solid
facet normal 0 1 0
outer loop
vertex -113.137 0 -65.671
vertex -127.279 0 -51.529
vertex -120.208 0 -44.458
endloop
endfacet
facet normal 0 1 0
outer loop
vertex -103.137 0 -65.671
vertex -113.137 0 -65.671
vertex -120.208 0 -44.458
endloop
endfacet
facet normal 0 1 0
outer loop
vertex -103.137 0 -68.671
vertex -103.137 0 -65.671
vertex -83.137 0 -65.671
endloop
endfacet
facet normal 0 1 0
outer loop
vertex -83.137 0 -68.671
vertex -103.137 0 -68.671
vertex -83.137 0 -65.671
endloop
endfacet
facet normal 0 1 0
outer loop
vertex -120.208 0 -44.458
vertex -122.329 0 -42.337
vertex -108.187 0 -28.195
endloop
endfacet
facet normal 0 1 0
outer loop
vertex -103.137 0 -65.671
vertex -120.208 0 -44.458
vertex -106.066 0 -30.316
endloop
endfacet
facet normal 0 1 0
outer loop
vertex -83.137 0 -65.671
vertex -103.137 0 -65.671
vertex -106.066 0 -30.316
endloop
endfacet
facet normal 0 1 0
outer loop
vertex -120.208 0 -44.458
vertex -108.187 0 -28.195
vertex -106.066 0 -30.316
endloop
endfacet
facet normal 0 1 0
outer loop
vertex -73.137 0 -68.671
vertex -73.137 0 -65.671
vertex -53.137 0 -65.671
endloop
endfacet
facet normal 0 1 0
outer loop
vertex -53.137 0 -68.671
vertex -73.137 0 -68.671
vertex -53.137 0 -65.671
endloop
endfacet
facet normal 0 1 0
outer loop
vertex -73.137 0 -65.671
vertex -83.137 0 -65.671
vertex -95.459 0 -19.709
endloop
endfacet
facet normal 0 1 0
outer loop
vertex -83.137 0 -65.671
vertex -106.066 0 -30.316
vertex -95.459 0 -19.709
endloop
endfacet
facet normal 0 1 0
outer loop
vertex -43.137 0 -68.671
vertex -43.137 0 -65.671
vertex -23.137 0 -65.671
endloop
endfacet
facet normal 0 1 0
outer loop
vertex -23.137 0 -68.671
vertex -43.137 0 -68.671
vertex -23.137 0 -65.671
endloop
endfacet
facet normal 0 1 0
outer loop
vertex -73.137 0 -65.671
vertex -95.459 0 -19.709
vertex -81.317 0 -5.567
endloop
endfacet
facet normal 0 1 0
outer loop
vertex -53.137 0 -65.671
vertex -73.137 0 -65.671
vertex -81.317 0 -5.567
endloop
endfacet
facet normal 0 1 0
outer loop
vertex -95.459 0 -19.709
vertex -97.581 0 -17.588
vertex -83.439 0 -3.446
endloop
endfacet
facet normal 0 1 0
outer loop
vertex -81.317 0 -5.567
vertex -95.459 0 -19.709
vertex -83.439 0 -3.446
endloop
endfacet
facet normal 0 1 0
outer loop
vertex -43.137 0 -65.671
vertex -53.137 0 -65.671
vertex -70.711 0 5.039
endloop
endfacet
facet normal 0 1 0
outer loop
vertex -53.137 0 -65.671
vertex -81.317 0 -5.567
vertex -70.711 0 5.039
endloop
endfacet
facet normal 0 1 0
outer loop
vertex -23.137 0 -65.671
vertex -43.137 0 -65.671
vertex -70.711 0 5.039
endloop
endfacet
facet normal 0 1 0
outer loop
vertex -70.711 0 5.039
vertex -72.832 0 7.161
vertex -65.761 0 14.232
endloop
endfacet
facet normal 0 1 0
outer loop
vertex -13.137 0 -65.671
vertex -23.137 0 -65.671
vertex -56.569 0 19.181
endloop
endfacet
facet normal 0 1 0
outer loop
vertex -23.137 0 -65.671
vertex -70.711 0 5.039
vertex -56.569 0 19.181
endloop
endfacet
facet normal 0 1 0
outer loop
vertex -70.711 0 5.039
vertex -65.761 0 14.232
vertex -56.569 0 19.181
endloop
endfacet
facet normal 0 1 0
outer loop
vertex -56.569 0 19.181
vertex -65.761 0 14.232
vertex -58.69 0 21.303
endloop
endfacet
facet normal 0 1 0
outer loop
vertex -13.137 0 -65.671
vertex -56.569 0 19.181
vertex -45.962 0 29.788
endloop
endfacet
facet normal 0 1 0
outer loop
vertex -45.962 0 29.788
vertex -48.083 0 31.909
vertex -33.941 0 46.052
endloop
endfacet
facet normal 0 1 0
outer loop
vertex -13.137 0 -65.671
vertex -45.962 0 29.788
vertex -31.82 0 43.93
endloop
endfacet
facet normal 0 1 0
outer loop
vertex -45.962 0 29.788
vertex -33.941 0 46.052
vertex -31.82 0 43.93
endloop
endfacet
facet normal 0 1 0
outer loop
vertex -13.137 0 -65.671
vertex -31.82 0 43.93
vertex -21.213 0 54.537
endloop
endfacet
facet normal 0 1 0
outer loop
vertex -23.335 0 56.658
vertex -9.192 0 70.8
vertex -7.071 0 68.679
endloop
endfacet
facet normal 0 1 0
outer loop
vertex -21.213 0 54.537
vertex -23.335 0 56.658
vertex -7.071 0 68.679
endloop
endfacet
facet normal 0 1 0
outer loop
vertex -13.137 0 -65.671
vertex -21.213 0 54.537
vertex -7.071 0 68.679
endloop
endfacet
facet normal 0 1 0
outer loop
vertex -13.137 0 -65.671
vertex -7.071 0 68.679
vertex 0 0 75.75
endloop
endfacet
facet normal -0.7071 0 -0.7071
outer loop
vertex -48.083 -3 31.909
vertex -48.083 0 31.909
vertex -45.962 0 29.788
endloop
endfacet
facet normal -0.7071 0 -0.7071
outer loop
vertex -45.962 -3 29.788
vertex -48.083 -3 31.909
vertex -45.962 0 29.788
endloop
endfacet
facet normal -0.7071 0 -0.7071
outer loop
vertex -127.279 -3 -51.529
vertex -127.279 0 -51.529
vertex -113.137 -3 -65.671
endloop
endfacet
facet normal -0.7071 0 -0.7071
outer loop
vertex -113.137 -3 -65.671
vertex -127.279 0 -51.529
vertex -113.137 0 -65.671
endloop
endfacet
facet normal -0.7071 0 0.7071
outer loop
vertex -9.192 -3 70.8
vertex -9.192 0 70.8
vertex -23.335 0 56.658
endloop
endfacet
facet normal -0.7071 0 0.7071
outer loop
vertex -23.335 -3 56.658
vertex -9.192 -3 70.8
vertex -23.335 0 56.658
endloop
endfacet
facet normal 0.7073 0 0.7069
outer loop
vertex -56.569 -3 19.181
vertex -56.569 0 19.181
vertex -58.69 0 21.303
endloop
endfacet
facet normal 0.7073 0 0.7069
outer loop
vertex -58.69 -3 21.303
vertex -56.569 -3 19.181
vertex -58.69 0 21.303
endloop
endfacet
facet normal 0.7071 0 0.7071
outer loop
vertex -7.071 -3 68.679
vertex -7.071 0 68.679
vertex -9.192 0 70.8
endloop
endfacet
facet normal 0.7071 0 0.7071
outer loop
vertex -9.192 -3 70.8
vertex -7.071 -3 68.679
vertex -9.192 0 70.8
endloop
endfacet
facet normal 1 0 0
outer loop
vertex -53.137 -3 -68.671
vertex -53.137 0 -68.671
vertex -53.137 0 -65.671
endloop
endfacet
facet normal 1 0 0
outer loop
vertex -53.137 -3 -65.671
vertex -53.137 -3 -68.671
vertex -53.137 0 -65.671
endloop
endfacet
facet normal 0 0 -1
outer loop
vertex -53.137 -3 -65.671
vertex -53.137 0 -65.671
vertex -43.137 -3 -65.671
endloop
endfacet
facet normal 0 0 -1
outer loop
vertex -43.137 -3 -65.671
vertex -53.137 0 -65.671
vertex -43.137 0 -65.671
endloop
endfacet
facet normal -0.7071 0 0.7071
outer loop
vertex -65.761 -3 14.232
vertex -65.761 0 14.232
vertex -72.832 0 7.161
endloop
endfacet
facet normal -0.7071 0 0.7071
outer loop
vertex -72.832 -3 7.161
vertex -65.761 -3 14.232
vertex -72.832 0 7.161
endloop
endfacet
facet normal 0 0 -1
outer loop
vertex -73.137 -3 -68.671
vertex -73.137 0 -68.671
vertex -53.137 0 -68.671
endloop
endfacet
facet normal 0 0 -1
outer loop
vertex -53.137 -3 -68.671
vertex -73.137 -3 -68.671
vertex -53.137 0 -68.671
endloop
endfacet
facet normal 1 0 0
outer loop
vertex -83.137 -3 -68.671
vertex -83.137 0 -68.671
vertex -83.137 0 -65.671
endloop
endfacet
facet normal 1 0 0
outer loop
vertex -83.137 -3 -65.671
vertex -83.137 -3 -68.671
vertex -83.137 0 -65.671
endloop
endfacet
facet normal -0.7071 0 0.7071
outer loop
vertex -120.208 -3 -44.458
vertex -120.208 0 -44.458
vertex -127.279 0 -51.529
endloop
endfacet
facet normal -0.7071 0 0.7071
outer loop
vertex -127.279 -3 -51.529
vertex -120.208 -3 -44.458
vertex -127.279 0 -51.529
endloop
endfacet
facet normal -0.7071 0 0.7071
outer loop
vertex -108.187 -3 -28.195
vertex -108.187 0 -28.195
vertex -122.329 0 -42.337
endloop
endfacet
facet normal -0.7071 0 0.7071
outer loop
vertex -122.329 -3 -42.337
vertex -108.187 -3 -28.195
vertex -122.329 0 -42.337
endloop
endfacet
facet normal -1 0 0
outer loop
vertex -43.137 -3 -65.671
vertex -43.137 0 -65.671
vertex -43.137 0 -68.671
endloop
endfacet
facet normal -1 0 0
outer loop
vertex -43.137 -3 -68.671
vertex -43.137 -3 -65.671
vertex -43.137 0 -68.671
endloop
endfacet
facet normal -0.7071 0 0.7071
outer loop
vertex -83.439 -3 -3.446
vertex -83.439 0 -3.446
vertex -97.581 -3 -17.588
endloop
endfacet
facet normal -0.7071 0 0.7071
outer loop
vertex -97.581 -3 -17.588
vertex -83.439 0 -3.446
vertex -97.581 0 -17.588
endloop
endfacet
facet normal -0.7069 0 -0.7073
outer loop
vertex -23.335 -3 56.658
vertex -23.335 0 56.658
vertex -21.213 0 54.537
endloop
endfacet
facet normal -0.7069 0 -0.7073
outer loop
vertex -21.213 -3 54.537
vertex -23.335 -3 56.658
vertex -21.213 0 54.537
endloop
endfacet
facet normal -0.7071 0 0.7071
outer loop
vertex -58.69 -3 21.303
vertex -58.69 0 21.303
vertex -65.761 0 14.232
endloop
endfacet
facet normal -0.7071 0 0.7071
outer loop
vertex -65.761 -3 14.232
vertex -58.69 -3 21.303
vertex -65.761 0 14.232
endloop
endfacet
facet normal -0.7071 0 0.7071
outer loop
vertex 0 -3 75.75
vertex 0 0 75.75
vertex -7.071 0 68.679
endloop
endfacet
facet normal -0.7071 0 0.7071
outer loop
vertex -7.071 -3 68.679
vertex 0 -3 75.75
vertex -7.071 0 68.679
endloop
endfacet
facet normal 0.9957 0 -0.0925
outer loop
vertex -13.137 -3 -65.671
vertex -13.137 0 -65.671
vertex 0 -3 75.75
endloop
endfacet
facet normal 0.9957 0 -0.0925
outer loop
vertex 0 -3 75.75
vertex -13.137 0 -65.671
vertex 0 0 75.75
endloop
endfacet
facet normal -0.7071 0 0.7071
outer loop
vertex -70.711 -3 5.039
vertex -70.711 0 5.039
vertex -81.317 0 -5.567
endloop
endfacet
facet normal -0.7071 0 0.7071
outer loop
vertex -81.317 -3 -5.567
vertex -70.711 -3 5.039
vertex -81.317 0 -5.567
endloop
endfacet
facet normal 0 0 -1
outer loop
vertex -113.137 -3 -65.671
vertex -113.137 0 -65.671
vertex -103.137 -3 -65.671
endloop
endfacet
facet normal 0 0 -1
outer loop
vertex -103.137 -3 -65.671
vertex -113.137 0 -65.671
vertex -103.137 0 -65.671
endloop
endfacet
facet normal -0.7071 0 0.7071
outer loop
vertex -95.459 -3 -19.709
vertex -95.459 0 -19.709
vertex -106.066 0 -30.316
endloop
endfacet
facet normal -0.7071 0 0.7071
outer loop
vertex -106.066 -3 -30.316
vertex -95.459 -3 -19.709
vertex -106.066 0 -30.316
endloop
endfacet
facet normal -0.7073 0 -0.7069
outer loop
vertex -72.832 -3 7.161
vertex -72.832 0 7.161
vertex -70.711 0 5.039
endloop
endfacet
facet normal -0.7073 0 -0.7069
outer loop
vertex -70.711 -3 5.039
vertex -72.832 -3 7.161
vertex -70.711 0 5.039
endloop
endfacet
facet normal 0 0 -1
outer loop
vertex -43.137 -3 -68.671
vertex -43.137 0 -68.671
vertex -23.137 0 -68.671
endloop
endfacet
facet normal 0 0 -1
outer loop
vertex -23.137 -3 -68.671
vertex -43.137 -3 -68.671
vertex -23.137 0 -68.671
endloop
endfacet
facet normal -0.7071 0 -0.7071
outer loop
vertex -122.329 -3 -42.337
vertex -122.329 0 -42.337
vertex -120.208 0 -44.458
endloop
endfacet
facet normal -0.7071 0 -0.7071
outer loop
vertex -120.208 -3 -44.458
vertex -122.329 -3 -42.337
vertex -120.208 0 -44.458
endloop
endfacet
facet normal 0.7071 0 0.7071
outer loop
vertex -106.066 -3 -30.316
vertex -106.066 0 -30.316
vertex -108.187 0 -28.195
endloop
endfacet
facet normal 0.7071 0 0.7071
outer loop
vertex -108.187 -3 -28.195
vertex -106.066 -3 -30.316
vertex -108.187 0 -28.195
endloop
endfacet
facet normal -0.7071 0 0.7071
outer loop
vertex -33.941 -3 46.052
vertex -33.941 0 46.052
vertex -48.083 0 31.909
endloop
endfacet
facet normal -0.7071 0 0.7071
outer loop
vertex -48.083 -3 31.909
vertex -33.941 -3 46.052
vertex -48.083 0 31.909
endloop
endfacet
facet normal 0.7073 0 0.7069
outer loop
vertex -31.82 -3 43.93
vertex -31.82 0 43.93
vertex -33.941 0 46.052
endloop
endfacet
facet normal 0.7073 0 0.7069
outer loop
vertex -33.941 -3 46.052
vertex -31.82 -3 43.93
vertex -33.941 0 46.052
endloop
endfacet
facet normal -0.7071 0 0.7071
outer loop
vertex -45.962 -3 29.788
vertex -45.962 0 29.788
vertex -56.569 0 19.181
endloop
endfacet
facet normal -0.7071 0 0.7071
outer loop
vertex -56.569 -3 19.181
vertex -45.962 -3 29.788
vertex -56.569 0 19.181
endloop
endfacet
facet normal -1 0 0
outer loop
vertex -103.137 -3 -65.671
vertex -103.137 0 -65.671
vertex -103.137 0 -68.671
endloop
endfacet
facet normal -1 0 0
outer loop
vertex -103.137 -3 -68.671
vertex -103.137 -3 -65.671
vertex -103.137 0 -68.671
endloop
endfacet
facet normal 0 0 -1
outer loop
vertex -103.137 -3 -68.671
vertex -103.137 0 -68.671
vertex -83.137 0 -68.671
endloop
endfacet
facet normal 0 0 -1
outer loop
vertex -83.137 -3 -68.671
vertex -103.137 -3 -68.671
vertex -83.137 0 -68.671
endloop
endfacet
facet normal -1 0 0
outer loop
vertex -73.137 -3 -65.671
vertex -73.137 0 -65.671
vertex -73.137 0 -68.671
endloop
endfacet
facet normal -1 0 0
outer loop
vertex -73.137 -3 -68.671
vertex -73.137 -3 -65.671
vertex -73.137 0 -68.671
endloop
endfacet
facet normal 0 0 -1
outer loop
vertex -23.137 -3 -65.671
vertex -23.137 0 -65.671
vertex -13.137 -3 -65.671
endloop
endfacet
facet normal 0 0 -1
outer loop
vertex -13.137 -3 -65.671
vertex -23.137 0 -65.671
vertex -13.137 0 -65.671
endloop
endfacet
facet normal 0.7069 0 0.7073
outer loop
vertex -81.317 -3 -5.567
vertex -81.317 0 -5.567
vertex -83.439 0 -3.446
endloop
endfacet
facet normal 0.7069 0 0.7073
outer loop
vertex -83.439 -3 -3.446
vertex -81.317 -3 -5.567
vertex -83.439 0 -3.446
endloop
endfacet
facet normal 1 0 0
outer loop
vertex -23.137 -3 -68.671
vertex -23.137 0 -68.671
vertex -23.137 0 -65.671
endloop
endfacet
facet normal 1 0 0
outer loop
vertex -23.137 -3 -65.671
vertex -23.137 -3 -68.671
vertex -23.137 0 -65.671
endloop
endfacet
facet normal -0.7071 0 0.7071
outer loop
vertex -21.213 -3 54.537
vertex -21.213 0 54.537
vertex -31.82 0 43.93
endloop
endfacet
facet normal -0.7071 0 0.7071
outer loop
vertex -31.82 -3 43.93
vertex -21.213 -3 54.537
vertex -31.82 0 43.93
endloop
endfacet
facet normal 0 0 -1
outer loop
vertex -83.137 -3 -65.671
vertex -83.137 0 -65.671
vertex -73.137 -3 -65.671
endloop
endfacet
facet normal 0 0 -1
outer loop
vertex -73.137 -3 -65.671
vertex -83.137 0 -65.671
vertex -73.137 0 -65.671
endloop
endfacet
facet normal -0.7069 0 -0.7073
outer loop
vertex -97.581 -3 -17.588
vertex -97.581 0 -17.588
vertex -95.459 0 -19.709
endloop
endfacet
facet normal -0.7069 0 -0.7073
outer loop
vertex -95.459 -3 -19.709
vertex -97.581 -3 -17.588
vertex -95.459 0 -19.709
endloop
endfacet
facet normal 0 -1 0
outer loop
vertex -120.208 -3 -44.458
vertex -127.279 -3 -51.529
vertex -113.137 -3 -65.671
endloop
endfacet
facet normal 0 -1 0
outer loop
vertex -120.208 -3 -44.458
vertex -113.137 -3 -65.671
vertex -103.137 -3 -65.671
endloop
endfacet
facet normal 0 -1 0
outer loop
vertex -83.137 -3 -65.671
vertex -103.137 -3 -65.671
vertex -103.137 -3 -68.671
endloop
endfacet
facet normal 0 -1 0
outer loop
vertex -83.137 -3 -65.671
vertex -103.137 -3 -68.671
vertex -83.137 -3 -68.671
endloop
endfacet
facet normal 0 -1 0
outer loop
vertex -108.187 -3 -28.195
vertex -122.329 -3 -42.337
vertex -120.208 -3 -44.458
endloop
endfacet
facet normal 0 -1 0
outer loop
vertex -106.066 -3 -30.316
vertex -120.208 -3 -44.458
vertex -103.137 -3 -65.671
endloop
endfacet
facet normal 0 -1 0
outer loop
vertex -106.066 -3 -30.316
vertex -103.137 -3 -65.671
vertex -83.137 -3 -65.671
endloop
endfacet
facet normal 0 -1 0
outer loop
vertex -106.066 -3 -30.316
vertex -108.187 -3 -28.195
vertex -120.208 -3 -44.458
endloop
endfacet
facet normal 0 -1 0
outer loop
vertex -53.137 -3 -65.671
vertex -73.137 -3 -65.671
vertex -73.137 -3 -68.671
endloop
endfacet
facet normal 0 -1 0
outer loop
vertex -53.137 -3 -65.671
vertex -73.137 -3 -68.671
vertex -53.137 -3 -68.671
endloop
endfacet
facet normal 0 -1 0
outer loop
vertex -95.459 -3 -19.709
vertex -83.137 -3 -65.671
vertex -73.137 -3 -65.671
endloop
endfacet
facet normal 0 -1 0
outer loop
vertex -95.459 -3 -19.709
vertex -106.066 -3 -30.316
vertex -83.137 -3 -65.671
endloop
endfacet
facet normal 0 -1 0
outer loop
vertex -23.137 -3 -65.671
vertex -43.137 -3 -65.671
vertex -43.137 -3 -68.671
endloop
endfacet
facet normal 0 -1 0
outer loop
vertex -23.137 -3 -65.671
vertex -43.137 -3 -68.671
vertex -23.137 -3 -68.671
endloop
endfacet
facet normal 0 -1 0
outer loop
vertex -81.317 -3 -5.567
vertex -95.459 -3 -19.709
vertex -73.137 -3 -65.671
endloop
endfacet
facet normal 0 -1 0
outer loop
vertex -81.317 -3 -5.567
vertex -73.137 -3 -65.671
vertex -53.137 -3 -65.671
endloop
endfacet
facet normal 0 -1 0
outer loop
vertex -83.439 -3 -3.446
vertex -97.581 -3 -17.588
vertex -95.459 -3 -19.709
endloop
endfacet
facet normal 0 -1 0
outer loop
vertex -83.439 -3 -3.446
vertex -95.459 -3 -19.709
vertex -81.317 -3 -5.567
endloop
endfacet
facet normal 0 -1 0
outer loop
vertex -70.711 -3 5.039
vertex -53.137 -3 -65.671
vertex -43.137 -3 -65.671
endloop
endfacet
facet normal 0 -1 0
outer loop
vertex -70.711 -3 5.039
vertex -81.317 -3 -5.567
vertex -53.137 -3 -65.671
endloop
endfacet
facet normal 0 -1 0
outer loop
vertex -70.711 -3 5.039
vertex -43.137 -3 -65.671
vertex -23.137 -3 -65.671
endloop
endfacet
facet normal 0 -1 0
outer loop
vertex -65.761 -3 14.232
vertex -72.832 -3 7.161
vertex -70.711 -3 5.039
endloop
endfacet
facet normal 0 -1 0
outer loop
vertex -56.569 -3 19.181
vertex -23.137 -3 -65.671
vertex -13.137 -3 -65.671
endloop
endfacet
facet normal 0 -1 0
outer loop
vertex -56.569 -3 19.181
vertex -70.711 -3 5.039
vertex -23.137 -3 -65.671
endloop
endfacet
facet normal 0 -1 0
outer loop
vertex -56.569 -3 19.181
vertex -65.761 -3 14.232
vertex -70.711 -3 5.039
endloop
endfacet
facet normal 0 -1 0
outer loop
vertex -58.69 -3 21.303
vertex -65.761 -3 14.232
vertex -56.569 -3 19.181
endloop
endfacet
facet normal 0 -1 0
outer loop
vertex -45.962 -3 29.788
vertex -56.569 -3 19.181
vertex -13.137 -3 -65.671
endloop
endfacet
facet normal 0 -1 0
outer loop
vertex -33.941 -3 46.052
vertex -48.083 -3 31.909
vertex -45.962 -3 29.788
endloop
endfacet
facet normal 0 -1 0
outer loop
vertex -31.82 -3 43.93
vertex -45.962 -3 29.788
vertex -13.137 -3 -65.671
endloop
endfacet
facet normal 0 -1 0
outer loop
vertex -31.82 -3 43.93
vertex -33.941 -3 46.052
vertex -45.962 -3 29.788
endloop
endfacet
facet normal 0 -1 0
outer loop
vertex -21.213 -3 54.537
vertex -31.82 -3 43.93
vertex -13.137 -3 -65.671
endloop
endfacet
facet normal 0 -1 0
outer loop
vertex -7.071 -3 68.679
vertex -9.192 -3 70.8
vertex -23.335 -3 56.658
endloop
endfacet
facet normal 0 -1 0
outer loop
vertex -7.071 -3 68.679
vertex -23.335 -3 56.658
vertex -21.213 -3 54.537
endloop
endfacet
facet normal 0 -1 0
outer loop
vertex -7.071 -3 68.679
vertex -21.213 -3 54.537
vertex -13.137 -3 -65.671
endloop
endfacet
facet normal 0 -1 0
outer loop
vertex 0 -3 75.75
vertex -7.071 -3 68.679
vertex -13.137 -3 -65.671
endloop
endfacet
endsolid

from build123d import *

# Parameters (mm, degrees)
F1_DEPTH = 3


with BuildPart() as f1:
    # F0 (on Front) → F1 (new body)
    with BuildSketch(Plane.XZ):
        Polygon((-13.137085, -65.671355), (0, 75.750001), (-7.071068, 68.678933), (-9.192388, 70.800253), (-23.334524, 56.658118), (-21.213203, 54.536797), (-31.819805, 43.930196), (-33.941125, 46.051516), (-48.083261, 31.90938), (-45.961941, 29.78806), (-56.568542, 19.181458), (-58.689863, 21.302779), (-65.760931, 14.231711), (-72.831998, 7.160643), (-70.710678, 5.039323), (-81.31728, -5.567279), (-83.4386, -3.445959), (-97.580736, -17.588094), (-95.459415, -19.709415), (-106.066017, -30.316016), (-108.187338, -28.194696), (-122.329473, -42.336832), (-120.208153, -44.458152), (-127.279221, -51.52922), (-113.137085, -65.671355), (-103.137085, -65.671355), (-103.137085, -68.671355), (-83.137085, -68.671355), (-83.137085, -65.671355), (-73.137085, -65.671355), (-73.137085, -68.671355), (-53.137085, -68.671355), (-53.137085, -65.671355), (-43.137085, -65.671355), (-43.137085, -68.671355), (-23.137085, -68.671355), (-23.137085, -65.671355), align=None)
    extrude(amount=F1_DEPTH)


solid = f1.part
